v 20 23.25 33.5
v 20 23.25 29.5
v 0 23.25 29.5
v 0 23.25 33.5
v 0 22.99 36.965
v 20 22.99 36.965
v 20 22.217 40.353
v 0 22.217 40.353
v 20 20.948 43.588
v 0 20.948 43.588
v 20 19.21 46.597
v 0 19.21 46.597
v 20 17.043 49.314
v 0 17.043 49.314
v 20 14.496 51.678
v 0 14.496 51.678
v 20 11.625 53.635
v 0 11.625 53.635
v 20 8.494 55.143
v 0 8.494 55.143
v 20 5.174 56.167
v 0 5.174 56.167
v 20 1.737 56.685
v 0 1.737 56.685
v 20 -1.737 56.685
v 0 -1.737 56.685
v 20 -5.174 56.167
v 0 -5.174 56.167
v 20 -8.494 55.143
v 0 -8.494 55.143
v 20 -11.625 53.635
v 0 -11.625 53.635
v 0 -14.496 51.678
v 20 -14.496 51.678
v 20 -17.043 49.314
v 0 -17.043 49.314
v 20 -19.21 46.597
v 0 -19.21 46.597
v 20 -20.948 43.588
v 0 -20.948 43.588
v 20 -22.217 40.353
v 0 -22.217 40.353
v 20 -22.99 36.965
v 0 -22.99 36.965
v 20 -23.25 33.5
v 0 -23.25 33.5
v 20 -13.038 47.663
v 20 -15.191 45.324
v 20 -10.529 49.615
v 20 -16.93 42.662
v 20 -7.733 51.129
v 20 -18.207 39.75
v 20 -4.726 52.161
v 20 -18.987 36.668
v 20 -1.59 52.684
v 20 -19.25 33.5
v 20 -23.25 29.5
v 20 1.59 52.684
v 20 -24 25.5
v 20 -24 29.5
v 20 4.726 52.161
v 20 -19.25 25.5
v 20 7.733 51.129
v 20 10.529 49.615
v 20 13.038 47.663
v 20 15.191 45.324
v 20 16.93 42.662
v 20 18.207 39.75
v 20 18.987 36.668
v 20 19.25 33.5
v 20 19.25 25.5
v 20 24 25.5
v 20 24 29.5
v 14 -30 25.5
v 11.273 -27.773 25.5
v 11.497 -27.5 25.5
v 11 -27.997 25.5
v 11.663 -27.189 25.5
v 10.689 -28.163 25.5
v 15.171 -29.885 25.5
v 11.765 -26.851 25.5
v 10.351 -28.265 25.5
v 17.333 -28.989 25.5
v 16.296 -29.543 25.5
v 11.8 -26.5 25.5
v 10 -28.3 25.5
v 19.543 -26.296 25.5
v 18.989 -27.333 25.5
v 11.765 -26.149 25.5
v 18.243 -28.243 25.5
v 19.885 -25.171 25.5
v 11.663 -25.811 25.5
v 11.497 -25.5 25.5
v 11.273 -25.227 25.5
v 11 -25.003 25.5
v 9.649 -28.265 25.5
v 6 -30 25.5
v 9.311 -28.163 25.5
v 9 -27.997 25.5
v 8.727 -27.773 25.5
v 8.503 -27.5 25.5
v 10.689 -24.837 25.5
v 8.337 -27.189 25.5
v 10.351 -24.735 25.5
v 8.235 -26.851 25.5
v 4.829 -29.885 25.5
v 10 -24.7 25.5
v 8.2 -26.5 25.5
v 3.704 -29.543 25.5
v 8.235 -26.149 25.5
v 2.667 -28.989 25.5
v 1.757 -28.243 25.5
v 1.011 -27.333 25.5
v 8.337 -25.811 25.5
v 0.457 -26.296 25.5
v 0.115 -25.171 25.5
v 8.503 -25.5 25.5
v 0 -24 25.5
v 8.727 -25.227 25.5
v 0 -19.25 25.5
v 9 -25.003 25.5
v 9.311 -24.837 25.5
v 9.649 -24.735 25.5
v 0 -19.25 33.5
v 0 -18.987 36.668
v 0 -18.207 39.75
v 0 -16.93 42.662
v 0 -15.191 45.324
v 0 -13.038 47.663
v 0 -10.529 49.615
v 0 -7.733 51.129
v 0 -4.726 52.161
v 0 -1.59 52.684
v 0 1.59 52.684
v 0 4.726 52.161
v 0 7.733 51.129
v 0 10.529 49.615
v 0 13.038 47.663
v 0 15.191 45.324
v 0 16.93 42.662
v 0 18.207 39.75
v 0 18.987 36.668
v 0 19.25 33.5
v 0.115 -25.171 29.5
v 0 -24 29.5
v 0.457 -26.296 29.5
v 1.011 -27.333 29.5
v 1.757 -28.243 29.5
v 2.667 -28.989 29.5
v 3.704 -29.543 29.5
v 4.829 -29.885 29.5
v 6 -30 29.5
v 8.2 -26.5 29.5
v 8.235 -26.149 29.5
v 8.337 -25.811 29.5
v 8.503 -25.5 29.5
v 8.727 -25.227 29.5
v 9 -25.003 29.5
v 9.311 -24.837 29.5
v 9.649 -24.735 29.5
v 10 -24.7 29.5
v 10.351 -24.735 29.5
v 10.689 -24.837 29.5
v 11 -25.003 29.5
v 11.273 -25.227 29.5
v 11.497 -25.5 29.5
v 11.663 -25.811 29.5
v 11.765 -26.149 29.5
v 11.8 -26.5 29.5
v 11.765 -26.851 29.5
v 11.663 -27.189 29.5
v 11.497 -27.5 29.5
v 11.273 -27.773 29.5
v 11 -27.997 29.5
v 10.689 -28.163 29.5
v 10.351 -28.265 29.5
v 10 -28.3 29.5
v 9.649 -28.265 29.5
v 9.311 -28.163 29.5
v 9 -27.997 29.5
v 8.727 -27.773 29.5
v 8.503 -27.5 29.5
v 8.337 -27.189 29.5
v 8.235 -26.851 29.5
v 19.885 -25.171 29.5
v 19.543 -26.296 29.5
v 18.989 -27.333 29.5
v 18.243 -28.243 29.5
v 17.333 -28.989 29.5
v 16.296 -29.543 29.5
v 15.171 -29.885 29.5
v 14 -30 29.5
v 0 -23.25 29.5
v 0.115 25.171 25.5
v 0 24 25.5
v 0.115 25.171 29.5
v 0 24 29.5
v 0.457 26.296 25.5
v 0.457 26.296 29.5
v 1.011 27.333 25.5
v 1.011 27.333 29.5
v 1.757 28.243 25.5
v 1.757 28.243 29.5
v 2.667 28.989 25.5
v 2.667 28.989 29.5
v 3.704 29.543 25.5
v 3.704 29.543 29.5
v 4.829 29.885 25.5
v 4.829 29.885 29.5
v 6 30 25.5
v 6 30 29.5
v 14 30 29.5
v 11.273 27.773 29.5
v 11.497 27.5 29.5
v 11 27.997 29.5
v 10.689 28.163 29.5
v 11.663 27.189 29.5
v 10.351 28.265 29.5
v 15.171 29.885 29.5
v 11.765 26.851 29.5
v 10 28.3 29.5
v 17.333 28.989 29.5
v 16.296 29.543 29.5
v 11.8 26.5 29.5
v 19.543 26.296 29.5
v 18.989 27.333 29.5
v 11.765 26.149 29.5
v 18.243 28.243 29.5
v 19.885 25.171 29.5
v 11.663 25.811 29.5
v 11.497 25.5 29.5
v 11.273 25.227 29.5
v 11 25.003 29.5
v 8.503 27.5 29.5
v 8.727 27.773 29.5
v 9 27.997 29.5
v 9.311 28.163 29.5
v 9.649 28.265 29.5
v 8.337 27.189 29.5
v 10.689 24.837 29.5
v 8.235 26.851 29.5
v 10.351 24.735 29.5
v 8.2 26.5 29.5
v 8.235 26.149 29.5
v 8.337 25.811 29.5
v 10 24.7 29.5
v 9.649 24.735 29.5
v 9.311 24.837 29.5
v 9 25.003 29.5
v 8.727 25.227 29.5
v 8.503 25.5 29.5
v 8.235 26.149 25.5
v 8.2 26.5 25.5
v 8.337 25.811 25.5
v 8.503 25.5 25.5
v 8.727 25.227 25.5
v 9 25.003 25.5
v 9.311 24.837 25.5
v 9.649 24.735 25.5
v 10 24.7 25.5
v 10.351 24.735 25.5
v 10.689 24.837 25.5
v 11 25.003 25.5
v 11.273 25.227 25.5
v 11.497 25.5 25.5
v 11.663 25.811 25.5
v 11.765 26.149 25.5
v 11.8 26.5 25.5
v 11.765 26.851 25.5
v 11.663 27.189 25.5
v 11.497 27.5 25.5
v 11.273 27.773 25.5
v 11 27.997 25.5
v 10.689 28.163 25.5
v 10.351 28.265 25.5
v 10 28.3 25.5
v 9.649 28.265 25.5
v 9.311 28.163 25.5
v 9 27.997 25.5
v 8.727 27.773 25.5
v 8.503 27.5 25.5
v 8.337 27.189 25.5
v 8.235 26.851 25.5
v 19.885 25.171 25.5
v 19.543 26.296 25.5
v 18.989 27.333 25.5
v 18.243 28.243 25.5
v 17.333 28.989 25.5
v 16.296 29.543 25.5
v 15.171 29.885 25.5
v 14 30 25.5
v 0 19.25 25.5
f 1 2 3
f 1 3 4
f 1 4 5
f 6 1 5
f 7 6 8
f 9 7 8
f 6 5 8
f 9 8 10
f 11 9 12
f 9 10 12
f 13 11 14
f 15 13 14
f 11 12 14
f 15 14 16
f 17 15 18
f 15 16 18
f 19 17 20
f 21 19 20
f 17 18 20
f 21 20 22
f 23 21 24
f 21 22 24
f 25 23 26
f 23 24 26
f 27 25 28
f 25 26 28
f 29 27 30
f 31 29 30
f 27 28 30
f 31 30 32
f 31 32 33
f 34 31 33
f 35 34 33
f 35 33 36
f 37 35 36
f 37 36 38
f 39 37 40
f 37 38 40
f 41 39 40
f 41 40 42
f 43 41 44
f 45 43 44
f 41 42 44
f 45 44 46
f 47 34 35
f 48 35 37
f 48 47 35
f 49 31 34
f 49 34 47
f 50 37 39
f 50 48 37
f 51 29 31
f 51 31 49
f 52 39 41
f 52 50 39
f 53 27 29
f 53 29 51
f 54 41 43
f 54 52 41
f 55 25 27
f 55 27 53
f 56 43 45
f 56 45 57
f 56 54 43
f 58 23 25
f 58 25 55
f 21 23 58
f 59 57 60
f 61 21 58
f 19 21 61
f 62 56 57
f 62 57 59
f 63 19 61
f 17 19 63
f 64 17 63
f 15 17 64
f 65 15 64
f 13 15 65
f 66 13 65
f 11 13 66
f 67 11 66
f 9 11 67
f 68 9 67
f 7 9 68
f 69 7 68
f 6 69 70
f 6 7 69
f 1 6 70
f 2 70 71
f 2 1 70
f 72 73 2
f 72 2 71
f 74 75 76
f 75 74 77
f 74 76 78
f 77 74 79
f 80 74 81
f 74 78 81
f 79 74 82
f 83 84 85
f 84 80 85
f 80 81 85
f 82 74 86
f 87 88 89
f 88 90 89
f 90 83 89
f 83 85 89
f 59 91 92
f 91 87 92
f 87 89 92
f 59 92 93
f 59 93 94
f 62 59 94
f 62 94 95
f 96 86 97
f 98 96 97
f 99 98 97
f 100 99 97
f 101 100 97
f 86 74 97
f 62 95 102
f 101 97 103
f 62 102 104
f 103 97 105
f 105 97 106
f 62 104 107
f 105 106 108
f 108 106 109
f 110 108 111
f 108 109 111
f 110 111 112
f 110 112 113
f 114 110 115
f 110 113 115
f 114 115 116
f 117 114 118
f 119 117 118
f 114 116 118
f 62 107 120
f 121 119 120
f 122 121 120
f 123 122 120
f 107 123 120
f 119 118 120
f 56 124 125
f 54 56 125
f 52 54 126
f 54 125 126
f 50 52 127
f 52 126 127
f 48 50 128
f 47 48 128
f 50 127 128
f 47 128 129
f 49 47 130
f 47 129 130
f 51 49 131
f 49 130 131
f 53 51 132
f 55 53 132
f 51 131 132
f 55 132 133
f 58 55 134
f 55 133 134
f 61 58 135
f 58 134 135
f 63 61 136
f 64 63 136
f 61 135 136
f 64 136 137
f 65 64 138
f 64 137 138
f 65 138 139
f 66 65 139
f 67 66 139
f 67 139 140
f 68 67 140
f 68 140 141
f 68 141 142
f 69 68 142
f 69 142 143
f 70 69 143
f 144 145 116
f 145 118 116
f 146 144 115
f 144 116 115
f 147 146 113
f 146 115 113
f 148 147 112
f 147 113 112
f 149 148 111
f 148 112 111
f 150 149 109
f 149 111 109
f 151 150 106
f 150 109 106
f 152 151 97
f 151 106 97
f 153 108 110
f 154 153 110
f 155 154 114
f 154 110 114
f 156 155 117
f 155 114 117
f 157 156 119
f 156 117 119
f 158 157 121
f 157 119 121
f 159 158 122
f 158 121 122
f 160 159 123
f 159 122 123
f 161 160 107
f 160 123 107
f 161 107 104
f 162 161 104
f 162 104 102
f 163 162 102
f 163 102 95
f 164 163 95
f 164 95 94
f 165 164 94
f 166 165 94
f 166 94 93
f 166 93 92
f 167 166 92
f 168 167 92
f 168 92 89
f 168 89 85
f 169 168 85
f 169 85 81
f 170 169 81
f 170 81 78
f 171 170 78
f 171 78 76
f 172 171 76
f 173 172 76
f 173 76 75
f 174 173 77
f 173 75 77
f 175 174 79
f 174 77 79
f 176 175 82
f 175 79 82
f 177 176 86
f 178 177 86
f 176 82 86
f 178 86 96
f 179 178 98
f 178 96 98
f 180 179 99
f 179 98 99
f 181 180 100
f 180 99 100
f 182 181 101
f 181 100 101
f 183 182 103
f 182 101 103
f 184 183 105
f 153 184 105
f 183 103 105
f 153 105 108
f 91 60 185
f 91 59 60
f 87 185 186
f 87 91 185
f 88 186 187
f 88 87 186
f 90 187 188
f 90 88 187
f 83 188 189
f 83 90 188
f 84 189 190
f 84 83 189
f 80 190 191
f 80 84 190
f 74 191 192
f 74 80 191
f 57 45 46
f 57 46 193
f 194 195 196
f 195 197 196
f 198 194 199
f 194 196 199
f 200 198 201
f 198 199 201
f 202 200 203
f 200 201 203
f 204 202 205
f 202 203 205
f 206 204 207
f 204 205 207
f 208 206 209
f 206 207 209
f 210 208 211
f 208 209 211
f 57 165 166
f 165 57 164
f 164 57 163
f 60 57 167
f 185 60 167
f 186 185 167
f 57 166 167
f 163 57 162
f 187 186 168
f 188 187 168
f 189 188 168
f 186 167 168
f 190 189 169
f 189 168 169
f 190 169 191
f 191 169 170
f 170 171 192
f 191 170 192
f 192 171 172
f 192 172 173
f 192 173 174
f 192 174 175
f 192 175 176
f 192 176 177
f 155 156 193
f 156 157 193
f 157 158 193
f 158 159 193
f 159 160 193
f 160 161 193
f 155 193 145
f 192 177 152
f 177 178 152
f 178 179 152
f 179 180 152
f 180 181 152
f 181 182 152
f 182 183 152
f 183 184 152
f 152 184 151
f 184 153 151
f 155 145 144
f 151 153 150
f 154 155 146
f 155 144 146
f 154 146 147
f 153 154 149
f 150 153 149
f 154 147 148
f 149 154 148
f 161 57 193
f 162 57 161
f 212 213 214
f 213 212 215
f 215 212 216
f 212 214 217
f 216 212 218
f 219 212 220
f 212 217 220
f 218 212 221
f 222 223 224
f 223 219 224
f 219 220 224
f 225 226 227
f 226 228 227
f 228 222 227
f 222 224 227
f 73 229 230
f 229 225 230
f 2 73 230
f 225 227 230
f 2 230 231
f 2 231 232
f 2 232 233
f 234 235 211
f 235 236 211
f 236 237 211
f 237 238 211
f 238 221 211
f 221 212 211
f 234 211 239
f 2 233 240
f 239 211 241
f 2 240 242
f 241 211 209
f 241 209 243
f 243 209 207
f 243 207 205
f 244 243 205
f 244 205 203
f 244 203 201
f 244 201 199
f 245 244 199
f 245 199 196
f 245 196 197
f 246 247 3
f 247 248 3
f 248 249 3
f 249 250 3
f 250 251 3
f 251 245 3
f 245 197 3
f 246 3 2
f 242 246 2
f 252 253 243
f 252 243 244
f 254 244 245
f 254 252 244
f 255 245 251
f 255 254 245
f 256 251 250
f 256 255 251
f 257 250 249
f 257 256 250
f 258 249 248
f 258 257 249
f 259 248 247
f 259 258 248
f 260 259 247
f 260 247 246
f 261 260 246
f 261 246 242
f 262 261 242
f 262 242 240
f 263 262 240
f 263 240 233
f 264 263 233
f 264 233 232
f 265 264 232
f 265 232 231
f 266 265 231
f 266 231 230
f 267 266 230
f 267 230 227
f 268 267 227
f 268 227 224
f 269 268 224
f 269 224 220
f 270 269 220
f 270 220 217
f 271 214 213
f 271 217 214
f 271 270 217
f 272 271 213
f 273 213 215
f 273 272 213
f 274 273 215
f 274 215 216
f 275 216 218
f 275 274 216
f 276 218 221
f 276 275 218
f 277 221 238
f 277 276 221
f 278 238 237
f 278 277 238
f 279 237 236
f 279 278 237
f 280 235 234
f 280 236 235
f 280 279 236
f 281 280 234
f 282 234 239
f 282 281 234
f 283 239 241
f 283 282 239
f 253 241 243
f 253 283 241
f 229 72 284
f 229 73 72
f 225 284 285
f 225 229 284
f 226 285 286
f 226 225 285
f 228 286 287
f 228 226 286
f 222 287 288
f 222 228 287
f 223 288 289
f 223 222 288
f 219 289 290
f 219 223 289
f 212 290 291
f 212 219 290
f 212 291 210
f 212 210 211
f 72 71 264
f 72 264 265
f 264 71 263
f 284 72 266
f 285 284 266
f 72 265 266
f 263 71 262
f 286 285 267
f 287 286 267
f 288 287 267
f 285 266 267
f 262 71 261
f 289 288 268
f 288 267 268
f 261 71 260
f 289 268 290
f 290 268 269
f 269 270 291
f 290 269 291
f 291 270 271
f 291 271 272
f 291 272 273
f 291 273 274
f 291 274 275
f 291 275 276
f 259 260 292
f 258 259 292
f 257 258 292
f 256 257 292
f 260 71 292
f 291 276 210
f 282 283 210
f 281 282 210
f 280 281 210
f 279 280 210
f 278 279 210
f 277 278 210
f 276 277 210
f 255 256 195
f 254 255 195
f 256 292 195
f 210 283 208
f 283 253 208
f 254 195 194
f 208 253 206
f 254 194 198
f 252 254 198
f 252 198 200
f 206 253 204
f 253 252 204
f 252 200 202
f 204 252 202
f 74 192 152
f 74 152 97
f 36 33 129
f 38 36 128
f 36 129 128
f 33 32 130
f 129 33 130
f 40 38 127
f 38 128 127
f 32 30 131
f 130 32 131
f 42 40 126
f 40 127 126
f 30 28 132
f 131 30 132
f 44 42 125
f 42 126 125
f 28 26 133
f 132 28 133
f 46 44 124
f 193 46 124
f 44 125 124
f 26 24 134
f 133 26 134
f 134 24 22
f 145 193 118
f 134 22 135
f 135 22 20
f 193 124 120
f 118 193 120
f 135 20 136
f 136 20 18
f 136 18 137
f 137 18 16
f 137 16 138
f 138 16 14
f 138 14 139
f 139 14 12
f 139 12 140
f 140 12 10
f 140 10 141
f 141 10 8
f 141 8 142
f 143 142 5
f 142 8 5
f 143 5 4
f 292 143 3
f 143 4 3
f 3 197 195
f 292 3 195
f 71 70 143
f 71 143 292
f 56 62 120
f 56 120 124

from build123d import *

# Parameters (mm, degrees)
MOTOR_CLAMP_EXTRUDE_DEPTH = 20
CLAMP_CLEARANCE_HOLE_D    = 3.6
CLAMP_CORNER_FILLETS_R    = 6


with BuildPart() as part:
    # Hold Down Bracket Sketch → Motor Clamp Extrude (new body)
    with BuildSketch(Plane(origin=(0, 0, 0), x_dir=(0, 0, -1), z_dir=(1, 0, 0))):
        with BuildLine():
            Line((-33.5, -23.25), (-29.5, -23.25))
            Line((-29.5, -23.25), (-29.5, -30))
            Line((-29.5, -30), (-25.5, -30))
            Line((-25.5, -30), (-25.5, -19.25))
            Line((-25.5, -19.25), (-33.5, -19.25))
            ThreePointArc((-33.5, -19.25), (-52.75, 0), (-33.5, 19.25))
            Line((-33.5, 19.25), (-25.5, 19.25))
            Line((-25.5, 19.25), (-25.5, 30))
            Line((-25.5, 30), (-29.5, 30))
            Line((-29.5, 30), (-29.5, 23.25))
            Line((-29.5, 23.25), (-33.5, 23.25))
            ThreePointArc((-33.5, 23.25), (-56.75, 0), (-33.5, -23.25))
        make_face()
    extrude(amount=MOTOR_CLAMP_EXTRUDE_DEPTH)

    # Clamp Clearance Hole (through all)
    with Locations(Plane.XY.offset(29.5)):
        with Locations((10, -26.5)):
            clamp_clearance_hole = Hole(CLAMP_CLEARANCE_HOLE_D / 2)

    # Clamp Clearance Hole Mirror: Clamp Clearance Hole across plane
    add(clamp_clearance_hole.mirror(Plane.ZX), mode=Mode.SUBTRACT)

    # Clamp Corner Fillets
    clamp_corner_fillets_edges = [part.edges().sort_by_distance(p)[0] for p in [
        (0, 30, 27.5),
        (0, -30, 27.5),
        (20, -30, 27.5),
        (20, 30, 27.5),
    ]]
    fillet(clamp_corner_fillets_edges, radius=CLAMP_CORNER_FILLETS_R)


solid = part.part
